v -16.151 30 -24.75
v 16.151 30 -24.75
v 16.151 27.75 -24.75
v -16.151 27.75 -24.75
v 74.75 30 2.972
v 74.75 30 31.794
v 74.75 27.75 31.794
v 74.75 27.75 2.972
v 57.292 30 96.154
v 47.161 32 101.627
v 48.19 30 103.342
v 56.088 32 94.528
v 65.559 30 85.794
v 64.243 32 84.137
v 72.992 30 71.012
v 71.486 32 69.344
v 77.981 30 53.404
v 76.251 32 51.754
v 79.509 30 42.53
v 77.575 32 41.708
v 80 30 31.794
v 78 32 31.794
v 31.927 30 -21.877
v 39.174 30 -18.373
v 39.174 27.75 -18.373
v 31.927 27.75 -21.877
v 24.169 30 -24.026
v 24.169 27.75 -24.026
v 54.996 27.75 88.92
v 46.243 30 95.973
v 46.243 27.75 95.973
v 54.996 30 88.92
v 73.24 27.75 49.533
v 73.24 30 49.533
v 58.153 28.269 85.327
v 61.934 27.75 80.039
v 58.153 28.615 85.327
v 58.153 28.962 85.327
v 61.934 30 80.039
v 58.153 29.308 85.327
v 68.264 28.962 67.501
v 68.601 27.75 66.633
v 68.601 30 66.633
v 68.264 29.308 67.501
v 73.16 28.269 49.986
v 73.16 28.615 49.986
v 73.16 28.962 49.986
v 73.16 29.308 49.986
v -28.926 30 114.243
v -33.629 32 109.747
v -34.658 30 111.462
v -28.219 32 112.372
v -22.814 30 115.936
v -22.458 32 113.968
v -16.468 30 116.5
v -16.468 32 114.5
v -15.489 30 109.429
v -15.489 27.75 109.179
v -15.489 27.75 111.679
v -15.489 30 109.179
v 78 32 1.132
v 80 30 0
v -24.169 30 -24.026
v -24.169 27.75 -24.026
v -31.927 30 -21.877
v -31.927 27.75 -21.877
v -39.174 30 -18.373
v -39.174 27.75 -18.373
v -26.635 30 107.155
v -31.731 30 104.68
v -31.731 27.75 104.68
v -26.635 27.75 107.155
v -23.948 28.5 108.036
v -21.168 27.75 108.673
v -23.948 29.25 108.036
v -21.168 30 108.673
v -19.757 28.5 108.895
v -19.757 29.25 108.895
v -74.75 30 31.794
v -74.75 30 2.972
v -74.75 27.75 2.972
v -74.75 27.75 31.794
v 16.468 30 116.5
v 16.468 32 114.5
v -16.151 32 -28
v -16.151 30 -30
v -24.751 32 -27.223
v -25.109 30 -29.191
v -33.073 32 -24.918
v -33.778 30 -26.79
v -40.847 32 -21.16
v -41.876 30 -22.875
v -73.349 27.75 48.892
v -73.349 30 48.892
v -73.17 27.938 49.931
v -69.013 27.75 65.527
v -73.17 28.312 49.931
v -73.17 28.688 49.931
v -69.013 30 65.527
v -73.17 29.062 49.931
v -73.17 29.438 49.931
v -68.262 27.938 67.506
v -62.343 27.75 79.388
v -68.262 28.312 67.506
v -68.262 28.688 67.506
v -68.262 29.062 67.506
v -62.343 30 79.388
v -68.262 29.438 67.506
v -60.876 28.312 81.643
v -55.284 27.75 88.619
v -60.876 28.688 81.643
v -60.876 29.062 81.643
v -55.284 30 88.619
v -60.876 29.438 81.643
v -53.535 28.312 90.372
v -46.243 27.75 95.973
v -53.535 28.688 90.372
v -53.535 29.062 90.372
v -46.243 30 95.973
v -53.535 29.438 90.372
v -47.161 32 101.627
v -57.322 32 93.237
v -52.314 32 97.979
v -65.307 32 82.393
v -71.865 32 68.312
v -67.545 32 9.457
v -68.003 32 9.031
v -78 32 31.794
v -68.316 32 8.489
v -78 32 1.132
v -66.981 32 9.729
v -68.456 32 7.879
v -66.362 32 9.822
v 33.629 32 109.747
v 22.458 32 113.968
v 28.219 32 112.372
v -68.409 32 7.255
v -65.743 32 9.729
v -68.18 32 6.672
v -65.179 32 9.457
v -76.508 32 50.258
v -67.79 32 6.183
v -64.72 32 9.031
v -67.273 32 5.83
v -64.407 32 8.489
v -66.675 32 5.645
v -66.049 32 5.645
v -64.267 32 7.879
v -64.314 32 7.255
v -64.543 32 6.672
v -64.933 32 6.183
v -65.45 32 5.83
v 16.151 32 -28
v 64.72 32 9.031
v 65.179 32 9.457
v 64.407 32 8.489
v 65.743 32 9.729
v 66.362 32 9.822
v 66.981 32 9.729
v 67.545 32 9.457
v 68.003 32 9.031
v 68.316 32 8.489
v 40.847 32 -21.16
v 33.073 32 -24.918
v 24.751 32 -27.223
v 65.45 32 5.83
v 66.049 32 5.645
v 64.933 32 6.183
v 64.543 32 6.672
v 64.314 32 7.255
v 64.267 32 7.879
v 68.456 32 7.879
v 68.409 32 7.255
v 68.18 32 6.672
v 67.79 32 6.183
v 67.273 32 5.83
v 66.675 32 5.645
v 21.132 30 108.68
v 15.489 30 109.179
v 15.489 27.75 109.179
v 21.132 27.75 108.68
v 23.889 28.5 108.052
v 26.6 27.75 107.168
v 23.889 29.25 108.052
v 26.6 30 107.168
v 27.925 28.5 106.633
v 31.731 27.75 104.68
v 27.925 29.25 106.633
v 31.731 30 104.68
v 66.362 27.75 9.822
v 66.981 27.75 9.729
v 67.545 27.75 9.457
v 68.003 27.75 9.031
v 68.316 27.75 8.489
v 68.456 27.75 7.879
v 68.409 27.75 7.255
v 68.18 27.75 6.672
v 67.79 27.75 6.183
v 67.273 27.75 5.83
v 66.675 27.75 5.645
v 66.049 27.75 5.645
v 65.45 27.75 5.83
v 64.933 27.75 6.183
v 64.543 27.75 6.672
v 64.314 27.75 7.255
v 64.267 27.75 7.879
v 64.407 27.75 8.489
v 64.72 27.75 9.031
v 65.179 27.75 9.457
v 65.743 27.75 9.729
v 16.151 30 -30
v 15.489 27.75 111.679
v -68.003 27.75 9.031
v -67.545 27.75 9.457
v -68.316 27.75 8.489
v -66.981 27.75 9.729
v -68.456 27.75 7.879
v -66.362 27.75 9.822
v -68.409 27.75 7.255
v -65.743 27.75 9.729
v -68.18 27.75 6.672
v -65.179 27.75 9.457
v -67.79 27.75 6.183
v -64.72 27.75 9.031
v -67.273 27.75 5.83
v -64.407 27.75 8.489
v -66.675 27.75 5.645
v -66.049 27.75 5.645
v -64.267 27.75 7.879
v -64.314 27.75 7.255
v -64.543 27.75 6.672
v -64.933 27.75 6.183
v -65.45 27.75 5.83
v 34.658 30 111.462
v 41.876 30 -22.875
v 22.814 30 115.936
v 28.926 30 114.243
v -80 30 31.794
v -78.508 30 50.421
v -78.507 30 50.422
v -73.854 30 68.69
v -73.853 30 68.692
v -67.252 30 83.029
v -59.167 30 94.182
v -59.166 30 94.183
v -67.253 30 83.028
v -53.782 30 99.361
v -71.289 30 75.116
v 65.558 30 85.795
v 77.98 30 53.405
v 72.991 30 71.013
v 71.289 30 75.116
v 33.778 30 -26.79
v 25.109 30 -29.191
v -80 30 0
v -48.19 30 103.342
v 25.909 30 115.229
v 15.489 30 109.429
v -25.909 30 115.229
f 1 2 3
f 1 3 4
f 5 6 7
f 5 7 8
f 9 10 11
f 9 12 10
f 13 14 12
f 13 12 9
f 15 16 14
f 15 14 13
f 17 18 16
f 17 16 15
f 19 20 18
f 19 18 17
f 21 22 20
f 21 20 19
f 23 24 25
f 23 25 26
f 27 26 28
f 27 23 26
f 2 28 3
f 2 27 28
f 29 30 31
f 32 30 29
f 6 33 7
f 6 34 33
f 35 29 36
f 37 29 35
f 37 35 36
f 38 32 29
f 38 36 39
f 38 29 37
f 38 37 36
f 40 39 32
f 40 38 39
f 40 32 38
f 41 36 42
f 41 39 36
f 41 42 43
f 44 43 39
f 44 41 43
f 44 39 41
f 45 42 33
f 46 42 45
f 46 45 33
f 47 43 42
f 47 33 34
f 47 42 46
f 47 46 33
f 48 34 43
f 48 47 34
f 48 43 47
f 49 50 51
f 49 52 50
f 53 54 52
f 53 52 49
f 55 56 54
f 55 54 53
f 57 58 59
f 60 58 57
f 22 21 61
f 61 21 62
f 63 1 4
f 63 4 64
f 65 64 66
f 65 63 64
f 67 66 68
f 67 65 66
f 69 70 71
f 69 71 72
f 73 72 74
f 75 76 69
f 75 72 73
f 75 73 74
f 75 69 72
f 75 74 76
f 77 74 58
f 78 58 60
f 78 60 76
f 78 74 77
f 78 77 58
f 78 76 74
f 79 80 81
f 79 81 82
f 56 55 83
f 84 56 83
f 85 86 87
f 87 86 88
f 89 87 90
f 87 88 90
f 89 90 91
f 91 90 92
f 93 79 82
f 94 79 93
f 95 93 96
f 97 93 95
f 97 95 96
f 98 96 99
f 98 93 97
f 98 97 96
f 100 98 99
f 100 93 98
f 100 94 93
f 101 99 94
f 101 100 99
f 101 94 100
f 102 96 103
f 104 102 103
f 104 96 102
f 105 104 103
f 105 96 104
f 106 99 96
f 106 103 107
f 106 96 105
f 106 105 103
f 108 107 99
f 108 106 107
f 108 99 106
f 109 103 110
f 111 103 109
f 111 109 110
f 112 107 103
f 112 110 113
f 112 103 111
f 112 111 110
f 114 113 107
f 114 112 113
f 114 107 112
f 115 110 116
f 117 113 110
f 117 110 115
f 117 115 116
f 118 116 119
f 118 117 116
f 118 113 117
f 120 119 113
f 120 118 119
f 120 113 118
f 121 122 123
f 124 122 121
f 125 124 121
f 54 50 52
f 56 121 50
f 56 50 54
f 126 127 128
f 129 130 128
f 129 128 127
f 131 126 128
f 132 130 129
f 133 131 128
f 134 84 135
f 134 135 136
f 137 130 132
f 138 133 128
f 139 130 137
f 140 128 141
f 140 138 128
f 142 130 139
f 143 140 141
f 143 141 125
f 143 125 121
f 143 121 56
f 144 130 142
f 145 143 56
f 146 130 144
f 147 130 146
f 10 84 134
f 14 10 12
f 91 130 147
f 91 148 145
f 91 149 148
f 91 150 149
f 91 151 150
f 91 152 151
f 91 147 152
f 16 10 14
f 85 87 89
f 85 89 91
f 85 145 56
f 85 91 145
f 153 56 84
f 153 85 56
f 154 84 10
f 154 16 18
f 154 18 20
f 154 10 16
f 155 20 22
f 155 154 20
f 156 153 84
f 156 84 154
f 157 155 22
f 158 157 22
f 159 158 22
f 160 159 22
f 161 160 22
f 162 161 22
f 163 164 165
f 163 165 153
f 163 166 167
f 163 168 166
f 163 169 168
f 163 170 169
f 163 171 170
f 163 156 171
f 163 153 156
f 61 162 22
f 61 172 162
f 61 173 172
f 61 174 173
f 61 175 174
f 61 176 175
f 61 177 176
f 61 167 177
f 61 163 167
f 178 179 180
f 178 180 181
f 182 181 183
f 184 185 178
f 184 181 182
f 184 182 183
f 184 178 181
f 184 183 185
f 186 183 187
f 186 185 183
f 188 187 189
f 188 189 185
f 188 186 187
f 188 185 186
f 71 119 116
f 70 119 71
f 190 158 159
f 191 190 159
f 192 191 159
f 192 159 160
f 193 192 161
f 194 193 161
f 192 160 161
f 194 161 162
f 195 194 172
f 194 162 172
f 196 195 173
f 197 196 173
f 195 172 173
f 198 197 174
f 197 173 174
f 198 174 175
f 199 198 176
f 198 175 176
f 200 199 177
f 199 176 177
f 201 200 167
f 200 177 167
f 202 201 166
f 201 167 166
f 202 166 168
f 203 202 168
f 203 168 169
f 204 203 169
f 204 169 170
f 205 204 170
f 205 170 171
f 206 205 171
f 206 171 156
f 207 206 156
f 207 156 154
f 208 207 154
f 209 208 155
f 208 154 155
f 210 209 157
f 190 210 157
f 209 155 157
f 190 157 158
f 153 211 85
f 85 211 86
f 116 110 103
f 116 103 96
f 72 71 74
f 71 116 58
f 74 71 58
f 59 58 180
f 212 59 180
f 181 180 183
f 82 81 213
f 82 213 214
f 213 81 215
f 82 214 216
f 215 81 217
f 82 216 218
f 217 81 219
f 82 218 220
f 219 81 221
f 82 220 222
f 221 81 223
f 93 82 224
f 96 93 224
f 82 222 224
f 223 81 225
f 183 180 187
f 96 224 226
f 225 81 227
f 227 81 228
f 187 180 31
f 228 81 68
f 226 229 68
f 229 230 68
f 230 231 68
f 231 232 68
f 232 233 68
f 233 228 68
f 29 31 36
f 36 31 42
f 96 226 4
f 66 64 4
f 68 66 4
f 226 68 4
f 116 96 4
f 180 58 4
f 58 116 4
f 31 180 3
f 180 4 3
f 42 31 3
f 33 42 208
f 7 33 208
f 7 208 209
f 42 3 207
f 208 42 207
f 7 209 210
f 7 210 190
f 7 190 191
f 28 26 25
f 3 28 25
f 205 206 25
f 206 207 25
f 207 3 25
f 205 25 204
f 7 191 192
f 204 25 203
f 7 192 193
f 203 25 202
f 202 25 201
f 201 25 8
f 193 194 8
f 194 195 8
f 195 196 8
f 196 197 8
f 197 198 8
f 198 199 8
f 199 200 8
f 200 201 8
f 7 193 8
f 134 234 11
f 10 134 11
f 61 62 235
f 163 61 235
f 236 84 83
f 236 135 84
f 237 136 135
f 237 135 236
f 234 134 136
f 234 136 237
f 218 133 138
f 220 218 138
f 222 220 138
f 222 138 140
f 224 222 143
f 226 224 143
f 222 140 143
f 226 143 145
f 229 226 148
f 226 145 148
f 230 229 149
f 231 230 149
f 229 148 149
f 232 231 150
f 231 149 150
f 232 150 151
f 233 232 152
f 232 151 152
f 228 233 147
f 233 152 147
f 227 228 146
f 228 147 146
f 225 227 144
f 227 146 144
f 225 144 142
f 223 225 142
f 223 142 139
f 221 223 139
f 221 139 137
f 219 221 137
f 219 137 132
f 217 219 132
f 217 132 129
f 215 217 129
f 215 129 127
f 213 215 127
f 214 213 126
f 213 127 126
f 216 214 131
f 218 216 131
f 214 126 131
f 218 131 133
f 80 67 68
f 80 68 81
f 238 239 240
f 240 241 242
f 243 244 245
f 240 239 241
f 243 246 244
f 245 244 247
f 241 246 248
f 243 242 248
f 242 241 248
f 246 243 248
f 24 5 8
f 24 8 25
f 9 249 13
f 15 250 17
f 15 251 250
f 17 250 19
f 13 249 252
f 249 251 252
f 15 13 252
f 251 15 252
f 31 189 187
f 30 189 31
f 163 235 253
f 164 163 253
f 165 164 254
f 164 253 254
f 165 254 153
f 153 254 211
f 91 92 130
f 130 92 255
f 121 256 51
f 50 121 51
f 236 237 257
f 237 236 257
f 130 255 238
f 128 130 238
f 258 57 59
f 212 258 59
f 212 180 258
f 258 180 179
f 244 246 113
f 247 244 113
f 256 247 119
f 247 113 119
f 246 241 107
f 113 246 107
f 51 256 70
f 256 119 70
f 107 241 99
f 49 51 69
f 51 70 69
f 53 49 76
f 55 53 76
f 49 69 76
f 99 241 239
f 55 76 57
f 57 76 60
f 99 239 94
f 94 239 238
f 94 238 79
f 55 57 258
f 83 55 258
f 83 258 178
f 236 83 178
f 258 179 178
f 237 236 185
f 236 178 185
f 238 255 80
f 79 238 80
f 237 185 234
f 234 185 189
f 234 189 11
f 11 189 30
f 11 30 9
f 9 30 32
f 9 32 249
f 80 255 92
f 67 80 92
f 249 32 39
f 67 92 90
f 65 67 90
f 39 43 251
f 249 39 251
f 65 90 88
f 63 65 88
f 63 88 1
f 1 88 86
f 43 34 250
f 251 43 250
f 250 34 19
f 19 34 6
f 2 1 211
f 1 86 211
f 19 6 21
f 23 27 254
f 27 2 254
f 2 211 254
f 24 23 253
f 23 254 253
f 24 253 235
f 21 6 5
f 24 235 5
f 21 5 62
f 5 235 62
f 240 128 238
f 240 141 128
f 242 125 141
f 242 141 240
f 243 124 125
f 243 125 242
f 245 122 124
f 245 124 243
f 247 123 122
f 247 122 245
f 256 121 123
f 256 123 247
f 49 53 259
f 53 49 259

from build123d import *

# Parameters (mm, degrees)
BOSS_EXTRUDE1_DEPTH = 2.25
BOSS_EXTRUDE2_DEPTH = 2
CHAMFER1_SIZE       = 2
SKETCH2_R           = 2.1
CUT_EXTRUDE3_DEPTH  = 4.25
BOSS_EXTRUDE3_REACH = 165.691
SKETCH4_W           = 30.977136558
SKETCH4_H           = 2.25


with BuildPart() as part:
    # Sketch1 → Boss-Extrude1 (new body)
    with BuildSketch(Plane(origin=(0, 30, 0), x_dir=(1, 0, 0), z_dir=(0, 1, 0))):
        with BuildLine():
            Line((16.150801753, 24.75), (-16.150801753, 24.75))
            ThreePointArc((-16.150801753, 24.75), (-28.096079542, 23.126243037), (-39.174486808, 18.372808426))
            Line((-39.174486808, 18.372808426), (-74.75, -2.97249949))
            Line((-74.75, -2.97249949), (-74.75, -31.794317372))
            add(Edge.make_bspline(
                [(-74.75, -31.794317372), (-74.75, -34.854957393), (-74.617964132, -37.896617098), (-74.092634279, -43.942380332), (-73.699378084, -46.946489294), (-72.640258958, -52.915519667), (-71.97459072, -55.880469065), (-70.750169489, -60.295417047), (-70.303298869, -61.763844969), (-69.338133577, -64.660739638), (-68.819099262, -66.092346674), (-67.147343369, -70.334199296), (-65.881052999, -73.091977263), (-63.717003155, -77.10639512), (-62.951317542, -78.424051782), (-61.728649984, -80.366285253), (-61.307989229, -81.009022825), (-60.443810311, -82.277119387), (-60.001044485, -82.901462706), (-57.731833326, -85.972836279), (-55.741550679, -88.270936188), (-52.431333352, -91.422844474), (-51.271504838, -92.425348837), (-48.832250491, -94.308303199), (-47.564474204, -95.179986516), (-46.242530751, -95.973152587)],
                knots=[0, 0, 0, 0, 0.125, 0.125, 0.25, 0.25, 0.375, 0.375, 0.4375, 0.4375, 0.5, 0.5, 0.625, 0.625, 0.6875, 0.6875, 0.71875, 0.71875, 0.75, 0.75, 0.875, 0.875, 0.9375, 0.9375, 1, 1, 1, 1], degree=3))
            Line((-46.242530751, -95.973152587), (-31.73109903, -104.68001162))
            add(Edge.make_bspline(
                [(-31.73109903, -104.68001162), (-29.275377335, -106.153444637), (-26.68234242, -107.275661914), (-22.580548307, -108.4161221), (-21.170611667, -108.705239228), (-18.343968581, -109.085294073), (-16.920969223, -109.178932188), (-15.488568279, -109.178932188)],
                knots=[0, 0, 0, 0, 0.5, 0.5, 0.75, 0.75, 1, 1, 1, 1], degree=3))
            Line((-15.488568279, -109.178932188), (15.488568279, -109.178932188))
            add(Edge.make_bspline(
                [(15.488568279, -109.178932188), (18.352407294, -109.178932188), (21.153292414, -108.807120107), (25.257313775, -107.674700988), (26.615074004, -107.197210462), (29.234437058, -106.068808934), (30.502825354, -105.416975826), (31.73109903, -104.68001162)],
                knots=[0, 0, 0, 0, 0.5, 0.5, 0.75, 0.75, 1, 1, 1, 1], degree=3))
            Line((31.73109903, -104.68001162), (46.242530751, -95.973152587))
            add(Edge.make_bspline(
                [(46.242530751, -95.973152587), (47.567869145, -95.177949551), (48.829466075, -94.309558847), (51.243712939, -92.447684976), (52.396262721, -91.454086815), (54.604509349, -89.355684378), (55.660153085, -88.25081912), (57.177112794, -86.517159458), (57.67228307, -85.925631056), (58.63283622, -84.728723238), (59.099288908, -84.122193289), (61.366991068, -81.05182626), (62.976708922, -78.476094674), (65.141118903, -74.466347585), (65.820469131, -73.105158474), (67.100436526, -70.336783684), (67.701854467, -68.927501042), (69.388296968, -64.647487304), (70.343996758, -61.758169069), (71.964810988, -55.917525955), (72.629539561, -52.966118736), (73.690525283, -47.006016439), (74.086644723, -43.997291976), (74.484256509, -39.442260691), (74.583986383, -37.915017565), (74.716839481, -34.856005184), (74.75, -33.325606239), (74.75, -31.794317372)],
                knots=[0, 0, 0, 0, 0.0625, 0.0625, 0.125, 0.125, 0.1875, 0.1875, 0.21875, 0.21875, 0.25, 0.25, 0.375, 0.375, 0.4375, 0.4375, 0.5, 0.5, 0.625, 0.625, 0.75, 0.75, 0.875, 0.875, 0.9375, 0.9375, 1, 1, 1, 1], degree=3))
            Line((74.75, -31.794317372), (74.75, -2.97249949))
            Line((74.75, -2.97249949), (39.174486808, 18.372808426))
            ThreePointArc((39.174486808, 18.372808426), (28.096079542, 23.126243037), (16.150801753, 24.75))
        make_face()
    extrude(amount=-BOSS_EXTRUDE1_DEPTH)

    # Sketch3 → Boss-Extrude2 (add)
    with BuildSketch(Plane(origin=(0, 30, 0), x_dir=(1, 0, 0), z_dir=(0, 1, 0))):
        with BuildLine():
            Line((16.150801753, 30), (-16.150801753, 30))
            ThreePointArc((-16.150801753, 30), (-29.497480847, 28.185746411), (-41.875589524, 22.874646286))
            Line((-41.875589524, 22.874646286), (-80, 0))
            Line((-80, 0), (-80, -31.794317372))
            add(Edge.make_bspline(
                [(-80, -31.794317372), (-80, -84.256429884), (-48.190171878, -103.342326757)],
                knots=[1.570796327, 1.570796327, 1.570796327, 2.769244761, 2.769244761, 2.769244761], degree=2, weights=[1, 0.825773406, 1]))
            Line((-48.190171878, -103.342326757), (-34.658026356, -111.46161407))
            add(Edge.make_bspline(
                [(-34.658026356, -111.46161407), (-26.260716473, -116.5), (-16.467854478, -116.5)],
                knots=[6.093295641, 6.093295641, 6.093295641, 6.473074974, 6.473074974, 6.473074974], degree=2, weights=[1, 0.982025067, 1]))
            Line((-16.467854478, -116.5), (16.467854478, -116.5))
            add(Edge.make_bspline(
                [(16.467854478, -116.5), (26.260716473, -116.5), (34.658026356, -111.46161407)],
                knots=[6.093295641, 6.093295641, 6.093295641, 6.473074974, 6.473074974, 6.473074974], degree=2, weights=[1, 0.982025067, 1]))
            Line((34.658026356, -111.46161407), (48.190171878, -103.342326757))
            add(Edge.make_bspline(
                [(48.190171878, -103.342326757), (80, -84.256429884), (80, -31.794317372)],
                knots=[0.372347892, 0.372347892, 0.372347892, 1.570796327, 1.570796327, 1.570796327], degree=2, weights=[1, 0.825773406, 1]))
            Line((80, -31.794317372), (80, 0))
            Line((80, 0), (41.875589524, 22.874646286))
            ThreePointArc((41.875589524, 22.874646286), (29.497480847, 28.185746411), (16.150801753, 30))
        make_face()
    extrude(amount=BOSS_EXTRUDE2_DEPTH)

    # Chamfer1
    chamfer1_edges = [part.edges().sort_by_distance(p)[0] for p in [
        (60.937794762, 32, -11.437323143),
        (80, 32, 15.897158686),
        (71.288670322, 32, 75.11613473),
        (41.424099117, 32, 107.401970414),
        (25.908664389, 32, 115.22898027),
        (0, 32, 116.5),
        (-25.908664389, 32, 115.22898027),
        (-41.424099117, 32, 107.401970414),
        (-71.288670322, 32, 75.11613473),
        (-80, 32, 15.897158686),
        (-60.937794762, 32, -11.437323143),
        (-29.497480847, 32, -28.185746411),
        (0, 32, -30),
        (29.497480847, 32, -28.185746411),
    ]]
    chamfer(chamfer1_edges, length=CHAMFER1_SIZE - 0.0001)  # a hair under: the kernel refuses the full size

    # Sketch2 → Cut-Extrude3 (cut)
    with BuildSketch(Plane(origin=(0, 32, 0), x_dir=(1, 0, 0), z_dir=(0, 1, 0))):
        with Locations(Location((66.361535838, -7.721967193, 0), (0, 0, 270))):
            Circle(SKETCH2_R)
        with Locations(Location((-66.361535838, -7.721967193, 0), (0, 0, 270))):
            Circle(SKETCH2_R)
    extrude(amount=-CUT_EXTRUDE3_DEPTH, mode=Mode.SUBTRACT)

    # Boss-Extrude3: up to this plane
    boss_extrude3_end = Plane(origin=(0, 26.464466094, 112.964466094), z_dir=(0, -0.7071067811865458, -0.7071067811865493))
    # Sketch4 → Boss-Extrude3 (add, up to the surface)
    with BuildSketch(Plane.XY.offset(109.178932188), mode=Mode.PRIVATE) as boss_extrude3_sk1:
        with Locations((0, 28.875)):
            Rectangle(SKETCH4_W, SKETCH4_H)
    boss_extrude3_tool1 = split(extrude(boss_extrude3_sk1.sketch, amount=BOSS_EXTRUDE3_REACH, mode=Mode.PRIVATE), bisect_by=boss_extrude3_end, keep=Keep.BOTH, mode=Mode.PRIVATE)
    add(boss_extrude3_tool1.solids().sort_by_distance((0, 28.875, 109.178932))[0])


solid = part.part
